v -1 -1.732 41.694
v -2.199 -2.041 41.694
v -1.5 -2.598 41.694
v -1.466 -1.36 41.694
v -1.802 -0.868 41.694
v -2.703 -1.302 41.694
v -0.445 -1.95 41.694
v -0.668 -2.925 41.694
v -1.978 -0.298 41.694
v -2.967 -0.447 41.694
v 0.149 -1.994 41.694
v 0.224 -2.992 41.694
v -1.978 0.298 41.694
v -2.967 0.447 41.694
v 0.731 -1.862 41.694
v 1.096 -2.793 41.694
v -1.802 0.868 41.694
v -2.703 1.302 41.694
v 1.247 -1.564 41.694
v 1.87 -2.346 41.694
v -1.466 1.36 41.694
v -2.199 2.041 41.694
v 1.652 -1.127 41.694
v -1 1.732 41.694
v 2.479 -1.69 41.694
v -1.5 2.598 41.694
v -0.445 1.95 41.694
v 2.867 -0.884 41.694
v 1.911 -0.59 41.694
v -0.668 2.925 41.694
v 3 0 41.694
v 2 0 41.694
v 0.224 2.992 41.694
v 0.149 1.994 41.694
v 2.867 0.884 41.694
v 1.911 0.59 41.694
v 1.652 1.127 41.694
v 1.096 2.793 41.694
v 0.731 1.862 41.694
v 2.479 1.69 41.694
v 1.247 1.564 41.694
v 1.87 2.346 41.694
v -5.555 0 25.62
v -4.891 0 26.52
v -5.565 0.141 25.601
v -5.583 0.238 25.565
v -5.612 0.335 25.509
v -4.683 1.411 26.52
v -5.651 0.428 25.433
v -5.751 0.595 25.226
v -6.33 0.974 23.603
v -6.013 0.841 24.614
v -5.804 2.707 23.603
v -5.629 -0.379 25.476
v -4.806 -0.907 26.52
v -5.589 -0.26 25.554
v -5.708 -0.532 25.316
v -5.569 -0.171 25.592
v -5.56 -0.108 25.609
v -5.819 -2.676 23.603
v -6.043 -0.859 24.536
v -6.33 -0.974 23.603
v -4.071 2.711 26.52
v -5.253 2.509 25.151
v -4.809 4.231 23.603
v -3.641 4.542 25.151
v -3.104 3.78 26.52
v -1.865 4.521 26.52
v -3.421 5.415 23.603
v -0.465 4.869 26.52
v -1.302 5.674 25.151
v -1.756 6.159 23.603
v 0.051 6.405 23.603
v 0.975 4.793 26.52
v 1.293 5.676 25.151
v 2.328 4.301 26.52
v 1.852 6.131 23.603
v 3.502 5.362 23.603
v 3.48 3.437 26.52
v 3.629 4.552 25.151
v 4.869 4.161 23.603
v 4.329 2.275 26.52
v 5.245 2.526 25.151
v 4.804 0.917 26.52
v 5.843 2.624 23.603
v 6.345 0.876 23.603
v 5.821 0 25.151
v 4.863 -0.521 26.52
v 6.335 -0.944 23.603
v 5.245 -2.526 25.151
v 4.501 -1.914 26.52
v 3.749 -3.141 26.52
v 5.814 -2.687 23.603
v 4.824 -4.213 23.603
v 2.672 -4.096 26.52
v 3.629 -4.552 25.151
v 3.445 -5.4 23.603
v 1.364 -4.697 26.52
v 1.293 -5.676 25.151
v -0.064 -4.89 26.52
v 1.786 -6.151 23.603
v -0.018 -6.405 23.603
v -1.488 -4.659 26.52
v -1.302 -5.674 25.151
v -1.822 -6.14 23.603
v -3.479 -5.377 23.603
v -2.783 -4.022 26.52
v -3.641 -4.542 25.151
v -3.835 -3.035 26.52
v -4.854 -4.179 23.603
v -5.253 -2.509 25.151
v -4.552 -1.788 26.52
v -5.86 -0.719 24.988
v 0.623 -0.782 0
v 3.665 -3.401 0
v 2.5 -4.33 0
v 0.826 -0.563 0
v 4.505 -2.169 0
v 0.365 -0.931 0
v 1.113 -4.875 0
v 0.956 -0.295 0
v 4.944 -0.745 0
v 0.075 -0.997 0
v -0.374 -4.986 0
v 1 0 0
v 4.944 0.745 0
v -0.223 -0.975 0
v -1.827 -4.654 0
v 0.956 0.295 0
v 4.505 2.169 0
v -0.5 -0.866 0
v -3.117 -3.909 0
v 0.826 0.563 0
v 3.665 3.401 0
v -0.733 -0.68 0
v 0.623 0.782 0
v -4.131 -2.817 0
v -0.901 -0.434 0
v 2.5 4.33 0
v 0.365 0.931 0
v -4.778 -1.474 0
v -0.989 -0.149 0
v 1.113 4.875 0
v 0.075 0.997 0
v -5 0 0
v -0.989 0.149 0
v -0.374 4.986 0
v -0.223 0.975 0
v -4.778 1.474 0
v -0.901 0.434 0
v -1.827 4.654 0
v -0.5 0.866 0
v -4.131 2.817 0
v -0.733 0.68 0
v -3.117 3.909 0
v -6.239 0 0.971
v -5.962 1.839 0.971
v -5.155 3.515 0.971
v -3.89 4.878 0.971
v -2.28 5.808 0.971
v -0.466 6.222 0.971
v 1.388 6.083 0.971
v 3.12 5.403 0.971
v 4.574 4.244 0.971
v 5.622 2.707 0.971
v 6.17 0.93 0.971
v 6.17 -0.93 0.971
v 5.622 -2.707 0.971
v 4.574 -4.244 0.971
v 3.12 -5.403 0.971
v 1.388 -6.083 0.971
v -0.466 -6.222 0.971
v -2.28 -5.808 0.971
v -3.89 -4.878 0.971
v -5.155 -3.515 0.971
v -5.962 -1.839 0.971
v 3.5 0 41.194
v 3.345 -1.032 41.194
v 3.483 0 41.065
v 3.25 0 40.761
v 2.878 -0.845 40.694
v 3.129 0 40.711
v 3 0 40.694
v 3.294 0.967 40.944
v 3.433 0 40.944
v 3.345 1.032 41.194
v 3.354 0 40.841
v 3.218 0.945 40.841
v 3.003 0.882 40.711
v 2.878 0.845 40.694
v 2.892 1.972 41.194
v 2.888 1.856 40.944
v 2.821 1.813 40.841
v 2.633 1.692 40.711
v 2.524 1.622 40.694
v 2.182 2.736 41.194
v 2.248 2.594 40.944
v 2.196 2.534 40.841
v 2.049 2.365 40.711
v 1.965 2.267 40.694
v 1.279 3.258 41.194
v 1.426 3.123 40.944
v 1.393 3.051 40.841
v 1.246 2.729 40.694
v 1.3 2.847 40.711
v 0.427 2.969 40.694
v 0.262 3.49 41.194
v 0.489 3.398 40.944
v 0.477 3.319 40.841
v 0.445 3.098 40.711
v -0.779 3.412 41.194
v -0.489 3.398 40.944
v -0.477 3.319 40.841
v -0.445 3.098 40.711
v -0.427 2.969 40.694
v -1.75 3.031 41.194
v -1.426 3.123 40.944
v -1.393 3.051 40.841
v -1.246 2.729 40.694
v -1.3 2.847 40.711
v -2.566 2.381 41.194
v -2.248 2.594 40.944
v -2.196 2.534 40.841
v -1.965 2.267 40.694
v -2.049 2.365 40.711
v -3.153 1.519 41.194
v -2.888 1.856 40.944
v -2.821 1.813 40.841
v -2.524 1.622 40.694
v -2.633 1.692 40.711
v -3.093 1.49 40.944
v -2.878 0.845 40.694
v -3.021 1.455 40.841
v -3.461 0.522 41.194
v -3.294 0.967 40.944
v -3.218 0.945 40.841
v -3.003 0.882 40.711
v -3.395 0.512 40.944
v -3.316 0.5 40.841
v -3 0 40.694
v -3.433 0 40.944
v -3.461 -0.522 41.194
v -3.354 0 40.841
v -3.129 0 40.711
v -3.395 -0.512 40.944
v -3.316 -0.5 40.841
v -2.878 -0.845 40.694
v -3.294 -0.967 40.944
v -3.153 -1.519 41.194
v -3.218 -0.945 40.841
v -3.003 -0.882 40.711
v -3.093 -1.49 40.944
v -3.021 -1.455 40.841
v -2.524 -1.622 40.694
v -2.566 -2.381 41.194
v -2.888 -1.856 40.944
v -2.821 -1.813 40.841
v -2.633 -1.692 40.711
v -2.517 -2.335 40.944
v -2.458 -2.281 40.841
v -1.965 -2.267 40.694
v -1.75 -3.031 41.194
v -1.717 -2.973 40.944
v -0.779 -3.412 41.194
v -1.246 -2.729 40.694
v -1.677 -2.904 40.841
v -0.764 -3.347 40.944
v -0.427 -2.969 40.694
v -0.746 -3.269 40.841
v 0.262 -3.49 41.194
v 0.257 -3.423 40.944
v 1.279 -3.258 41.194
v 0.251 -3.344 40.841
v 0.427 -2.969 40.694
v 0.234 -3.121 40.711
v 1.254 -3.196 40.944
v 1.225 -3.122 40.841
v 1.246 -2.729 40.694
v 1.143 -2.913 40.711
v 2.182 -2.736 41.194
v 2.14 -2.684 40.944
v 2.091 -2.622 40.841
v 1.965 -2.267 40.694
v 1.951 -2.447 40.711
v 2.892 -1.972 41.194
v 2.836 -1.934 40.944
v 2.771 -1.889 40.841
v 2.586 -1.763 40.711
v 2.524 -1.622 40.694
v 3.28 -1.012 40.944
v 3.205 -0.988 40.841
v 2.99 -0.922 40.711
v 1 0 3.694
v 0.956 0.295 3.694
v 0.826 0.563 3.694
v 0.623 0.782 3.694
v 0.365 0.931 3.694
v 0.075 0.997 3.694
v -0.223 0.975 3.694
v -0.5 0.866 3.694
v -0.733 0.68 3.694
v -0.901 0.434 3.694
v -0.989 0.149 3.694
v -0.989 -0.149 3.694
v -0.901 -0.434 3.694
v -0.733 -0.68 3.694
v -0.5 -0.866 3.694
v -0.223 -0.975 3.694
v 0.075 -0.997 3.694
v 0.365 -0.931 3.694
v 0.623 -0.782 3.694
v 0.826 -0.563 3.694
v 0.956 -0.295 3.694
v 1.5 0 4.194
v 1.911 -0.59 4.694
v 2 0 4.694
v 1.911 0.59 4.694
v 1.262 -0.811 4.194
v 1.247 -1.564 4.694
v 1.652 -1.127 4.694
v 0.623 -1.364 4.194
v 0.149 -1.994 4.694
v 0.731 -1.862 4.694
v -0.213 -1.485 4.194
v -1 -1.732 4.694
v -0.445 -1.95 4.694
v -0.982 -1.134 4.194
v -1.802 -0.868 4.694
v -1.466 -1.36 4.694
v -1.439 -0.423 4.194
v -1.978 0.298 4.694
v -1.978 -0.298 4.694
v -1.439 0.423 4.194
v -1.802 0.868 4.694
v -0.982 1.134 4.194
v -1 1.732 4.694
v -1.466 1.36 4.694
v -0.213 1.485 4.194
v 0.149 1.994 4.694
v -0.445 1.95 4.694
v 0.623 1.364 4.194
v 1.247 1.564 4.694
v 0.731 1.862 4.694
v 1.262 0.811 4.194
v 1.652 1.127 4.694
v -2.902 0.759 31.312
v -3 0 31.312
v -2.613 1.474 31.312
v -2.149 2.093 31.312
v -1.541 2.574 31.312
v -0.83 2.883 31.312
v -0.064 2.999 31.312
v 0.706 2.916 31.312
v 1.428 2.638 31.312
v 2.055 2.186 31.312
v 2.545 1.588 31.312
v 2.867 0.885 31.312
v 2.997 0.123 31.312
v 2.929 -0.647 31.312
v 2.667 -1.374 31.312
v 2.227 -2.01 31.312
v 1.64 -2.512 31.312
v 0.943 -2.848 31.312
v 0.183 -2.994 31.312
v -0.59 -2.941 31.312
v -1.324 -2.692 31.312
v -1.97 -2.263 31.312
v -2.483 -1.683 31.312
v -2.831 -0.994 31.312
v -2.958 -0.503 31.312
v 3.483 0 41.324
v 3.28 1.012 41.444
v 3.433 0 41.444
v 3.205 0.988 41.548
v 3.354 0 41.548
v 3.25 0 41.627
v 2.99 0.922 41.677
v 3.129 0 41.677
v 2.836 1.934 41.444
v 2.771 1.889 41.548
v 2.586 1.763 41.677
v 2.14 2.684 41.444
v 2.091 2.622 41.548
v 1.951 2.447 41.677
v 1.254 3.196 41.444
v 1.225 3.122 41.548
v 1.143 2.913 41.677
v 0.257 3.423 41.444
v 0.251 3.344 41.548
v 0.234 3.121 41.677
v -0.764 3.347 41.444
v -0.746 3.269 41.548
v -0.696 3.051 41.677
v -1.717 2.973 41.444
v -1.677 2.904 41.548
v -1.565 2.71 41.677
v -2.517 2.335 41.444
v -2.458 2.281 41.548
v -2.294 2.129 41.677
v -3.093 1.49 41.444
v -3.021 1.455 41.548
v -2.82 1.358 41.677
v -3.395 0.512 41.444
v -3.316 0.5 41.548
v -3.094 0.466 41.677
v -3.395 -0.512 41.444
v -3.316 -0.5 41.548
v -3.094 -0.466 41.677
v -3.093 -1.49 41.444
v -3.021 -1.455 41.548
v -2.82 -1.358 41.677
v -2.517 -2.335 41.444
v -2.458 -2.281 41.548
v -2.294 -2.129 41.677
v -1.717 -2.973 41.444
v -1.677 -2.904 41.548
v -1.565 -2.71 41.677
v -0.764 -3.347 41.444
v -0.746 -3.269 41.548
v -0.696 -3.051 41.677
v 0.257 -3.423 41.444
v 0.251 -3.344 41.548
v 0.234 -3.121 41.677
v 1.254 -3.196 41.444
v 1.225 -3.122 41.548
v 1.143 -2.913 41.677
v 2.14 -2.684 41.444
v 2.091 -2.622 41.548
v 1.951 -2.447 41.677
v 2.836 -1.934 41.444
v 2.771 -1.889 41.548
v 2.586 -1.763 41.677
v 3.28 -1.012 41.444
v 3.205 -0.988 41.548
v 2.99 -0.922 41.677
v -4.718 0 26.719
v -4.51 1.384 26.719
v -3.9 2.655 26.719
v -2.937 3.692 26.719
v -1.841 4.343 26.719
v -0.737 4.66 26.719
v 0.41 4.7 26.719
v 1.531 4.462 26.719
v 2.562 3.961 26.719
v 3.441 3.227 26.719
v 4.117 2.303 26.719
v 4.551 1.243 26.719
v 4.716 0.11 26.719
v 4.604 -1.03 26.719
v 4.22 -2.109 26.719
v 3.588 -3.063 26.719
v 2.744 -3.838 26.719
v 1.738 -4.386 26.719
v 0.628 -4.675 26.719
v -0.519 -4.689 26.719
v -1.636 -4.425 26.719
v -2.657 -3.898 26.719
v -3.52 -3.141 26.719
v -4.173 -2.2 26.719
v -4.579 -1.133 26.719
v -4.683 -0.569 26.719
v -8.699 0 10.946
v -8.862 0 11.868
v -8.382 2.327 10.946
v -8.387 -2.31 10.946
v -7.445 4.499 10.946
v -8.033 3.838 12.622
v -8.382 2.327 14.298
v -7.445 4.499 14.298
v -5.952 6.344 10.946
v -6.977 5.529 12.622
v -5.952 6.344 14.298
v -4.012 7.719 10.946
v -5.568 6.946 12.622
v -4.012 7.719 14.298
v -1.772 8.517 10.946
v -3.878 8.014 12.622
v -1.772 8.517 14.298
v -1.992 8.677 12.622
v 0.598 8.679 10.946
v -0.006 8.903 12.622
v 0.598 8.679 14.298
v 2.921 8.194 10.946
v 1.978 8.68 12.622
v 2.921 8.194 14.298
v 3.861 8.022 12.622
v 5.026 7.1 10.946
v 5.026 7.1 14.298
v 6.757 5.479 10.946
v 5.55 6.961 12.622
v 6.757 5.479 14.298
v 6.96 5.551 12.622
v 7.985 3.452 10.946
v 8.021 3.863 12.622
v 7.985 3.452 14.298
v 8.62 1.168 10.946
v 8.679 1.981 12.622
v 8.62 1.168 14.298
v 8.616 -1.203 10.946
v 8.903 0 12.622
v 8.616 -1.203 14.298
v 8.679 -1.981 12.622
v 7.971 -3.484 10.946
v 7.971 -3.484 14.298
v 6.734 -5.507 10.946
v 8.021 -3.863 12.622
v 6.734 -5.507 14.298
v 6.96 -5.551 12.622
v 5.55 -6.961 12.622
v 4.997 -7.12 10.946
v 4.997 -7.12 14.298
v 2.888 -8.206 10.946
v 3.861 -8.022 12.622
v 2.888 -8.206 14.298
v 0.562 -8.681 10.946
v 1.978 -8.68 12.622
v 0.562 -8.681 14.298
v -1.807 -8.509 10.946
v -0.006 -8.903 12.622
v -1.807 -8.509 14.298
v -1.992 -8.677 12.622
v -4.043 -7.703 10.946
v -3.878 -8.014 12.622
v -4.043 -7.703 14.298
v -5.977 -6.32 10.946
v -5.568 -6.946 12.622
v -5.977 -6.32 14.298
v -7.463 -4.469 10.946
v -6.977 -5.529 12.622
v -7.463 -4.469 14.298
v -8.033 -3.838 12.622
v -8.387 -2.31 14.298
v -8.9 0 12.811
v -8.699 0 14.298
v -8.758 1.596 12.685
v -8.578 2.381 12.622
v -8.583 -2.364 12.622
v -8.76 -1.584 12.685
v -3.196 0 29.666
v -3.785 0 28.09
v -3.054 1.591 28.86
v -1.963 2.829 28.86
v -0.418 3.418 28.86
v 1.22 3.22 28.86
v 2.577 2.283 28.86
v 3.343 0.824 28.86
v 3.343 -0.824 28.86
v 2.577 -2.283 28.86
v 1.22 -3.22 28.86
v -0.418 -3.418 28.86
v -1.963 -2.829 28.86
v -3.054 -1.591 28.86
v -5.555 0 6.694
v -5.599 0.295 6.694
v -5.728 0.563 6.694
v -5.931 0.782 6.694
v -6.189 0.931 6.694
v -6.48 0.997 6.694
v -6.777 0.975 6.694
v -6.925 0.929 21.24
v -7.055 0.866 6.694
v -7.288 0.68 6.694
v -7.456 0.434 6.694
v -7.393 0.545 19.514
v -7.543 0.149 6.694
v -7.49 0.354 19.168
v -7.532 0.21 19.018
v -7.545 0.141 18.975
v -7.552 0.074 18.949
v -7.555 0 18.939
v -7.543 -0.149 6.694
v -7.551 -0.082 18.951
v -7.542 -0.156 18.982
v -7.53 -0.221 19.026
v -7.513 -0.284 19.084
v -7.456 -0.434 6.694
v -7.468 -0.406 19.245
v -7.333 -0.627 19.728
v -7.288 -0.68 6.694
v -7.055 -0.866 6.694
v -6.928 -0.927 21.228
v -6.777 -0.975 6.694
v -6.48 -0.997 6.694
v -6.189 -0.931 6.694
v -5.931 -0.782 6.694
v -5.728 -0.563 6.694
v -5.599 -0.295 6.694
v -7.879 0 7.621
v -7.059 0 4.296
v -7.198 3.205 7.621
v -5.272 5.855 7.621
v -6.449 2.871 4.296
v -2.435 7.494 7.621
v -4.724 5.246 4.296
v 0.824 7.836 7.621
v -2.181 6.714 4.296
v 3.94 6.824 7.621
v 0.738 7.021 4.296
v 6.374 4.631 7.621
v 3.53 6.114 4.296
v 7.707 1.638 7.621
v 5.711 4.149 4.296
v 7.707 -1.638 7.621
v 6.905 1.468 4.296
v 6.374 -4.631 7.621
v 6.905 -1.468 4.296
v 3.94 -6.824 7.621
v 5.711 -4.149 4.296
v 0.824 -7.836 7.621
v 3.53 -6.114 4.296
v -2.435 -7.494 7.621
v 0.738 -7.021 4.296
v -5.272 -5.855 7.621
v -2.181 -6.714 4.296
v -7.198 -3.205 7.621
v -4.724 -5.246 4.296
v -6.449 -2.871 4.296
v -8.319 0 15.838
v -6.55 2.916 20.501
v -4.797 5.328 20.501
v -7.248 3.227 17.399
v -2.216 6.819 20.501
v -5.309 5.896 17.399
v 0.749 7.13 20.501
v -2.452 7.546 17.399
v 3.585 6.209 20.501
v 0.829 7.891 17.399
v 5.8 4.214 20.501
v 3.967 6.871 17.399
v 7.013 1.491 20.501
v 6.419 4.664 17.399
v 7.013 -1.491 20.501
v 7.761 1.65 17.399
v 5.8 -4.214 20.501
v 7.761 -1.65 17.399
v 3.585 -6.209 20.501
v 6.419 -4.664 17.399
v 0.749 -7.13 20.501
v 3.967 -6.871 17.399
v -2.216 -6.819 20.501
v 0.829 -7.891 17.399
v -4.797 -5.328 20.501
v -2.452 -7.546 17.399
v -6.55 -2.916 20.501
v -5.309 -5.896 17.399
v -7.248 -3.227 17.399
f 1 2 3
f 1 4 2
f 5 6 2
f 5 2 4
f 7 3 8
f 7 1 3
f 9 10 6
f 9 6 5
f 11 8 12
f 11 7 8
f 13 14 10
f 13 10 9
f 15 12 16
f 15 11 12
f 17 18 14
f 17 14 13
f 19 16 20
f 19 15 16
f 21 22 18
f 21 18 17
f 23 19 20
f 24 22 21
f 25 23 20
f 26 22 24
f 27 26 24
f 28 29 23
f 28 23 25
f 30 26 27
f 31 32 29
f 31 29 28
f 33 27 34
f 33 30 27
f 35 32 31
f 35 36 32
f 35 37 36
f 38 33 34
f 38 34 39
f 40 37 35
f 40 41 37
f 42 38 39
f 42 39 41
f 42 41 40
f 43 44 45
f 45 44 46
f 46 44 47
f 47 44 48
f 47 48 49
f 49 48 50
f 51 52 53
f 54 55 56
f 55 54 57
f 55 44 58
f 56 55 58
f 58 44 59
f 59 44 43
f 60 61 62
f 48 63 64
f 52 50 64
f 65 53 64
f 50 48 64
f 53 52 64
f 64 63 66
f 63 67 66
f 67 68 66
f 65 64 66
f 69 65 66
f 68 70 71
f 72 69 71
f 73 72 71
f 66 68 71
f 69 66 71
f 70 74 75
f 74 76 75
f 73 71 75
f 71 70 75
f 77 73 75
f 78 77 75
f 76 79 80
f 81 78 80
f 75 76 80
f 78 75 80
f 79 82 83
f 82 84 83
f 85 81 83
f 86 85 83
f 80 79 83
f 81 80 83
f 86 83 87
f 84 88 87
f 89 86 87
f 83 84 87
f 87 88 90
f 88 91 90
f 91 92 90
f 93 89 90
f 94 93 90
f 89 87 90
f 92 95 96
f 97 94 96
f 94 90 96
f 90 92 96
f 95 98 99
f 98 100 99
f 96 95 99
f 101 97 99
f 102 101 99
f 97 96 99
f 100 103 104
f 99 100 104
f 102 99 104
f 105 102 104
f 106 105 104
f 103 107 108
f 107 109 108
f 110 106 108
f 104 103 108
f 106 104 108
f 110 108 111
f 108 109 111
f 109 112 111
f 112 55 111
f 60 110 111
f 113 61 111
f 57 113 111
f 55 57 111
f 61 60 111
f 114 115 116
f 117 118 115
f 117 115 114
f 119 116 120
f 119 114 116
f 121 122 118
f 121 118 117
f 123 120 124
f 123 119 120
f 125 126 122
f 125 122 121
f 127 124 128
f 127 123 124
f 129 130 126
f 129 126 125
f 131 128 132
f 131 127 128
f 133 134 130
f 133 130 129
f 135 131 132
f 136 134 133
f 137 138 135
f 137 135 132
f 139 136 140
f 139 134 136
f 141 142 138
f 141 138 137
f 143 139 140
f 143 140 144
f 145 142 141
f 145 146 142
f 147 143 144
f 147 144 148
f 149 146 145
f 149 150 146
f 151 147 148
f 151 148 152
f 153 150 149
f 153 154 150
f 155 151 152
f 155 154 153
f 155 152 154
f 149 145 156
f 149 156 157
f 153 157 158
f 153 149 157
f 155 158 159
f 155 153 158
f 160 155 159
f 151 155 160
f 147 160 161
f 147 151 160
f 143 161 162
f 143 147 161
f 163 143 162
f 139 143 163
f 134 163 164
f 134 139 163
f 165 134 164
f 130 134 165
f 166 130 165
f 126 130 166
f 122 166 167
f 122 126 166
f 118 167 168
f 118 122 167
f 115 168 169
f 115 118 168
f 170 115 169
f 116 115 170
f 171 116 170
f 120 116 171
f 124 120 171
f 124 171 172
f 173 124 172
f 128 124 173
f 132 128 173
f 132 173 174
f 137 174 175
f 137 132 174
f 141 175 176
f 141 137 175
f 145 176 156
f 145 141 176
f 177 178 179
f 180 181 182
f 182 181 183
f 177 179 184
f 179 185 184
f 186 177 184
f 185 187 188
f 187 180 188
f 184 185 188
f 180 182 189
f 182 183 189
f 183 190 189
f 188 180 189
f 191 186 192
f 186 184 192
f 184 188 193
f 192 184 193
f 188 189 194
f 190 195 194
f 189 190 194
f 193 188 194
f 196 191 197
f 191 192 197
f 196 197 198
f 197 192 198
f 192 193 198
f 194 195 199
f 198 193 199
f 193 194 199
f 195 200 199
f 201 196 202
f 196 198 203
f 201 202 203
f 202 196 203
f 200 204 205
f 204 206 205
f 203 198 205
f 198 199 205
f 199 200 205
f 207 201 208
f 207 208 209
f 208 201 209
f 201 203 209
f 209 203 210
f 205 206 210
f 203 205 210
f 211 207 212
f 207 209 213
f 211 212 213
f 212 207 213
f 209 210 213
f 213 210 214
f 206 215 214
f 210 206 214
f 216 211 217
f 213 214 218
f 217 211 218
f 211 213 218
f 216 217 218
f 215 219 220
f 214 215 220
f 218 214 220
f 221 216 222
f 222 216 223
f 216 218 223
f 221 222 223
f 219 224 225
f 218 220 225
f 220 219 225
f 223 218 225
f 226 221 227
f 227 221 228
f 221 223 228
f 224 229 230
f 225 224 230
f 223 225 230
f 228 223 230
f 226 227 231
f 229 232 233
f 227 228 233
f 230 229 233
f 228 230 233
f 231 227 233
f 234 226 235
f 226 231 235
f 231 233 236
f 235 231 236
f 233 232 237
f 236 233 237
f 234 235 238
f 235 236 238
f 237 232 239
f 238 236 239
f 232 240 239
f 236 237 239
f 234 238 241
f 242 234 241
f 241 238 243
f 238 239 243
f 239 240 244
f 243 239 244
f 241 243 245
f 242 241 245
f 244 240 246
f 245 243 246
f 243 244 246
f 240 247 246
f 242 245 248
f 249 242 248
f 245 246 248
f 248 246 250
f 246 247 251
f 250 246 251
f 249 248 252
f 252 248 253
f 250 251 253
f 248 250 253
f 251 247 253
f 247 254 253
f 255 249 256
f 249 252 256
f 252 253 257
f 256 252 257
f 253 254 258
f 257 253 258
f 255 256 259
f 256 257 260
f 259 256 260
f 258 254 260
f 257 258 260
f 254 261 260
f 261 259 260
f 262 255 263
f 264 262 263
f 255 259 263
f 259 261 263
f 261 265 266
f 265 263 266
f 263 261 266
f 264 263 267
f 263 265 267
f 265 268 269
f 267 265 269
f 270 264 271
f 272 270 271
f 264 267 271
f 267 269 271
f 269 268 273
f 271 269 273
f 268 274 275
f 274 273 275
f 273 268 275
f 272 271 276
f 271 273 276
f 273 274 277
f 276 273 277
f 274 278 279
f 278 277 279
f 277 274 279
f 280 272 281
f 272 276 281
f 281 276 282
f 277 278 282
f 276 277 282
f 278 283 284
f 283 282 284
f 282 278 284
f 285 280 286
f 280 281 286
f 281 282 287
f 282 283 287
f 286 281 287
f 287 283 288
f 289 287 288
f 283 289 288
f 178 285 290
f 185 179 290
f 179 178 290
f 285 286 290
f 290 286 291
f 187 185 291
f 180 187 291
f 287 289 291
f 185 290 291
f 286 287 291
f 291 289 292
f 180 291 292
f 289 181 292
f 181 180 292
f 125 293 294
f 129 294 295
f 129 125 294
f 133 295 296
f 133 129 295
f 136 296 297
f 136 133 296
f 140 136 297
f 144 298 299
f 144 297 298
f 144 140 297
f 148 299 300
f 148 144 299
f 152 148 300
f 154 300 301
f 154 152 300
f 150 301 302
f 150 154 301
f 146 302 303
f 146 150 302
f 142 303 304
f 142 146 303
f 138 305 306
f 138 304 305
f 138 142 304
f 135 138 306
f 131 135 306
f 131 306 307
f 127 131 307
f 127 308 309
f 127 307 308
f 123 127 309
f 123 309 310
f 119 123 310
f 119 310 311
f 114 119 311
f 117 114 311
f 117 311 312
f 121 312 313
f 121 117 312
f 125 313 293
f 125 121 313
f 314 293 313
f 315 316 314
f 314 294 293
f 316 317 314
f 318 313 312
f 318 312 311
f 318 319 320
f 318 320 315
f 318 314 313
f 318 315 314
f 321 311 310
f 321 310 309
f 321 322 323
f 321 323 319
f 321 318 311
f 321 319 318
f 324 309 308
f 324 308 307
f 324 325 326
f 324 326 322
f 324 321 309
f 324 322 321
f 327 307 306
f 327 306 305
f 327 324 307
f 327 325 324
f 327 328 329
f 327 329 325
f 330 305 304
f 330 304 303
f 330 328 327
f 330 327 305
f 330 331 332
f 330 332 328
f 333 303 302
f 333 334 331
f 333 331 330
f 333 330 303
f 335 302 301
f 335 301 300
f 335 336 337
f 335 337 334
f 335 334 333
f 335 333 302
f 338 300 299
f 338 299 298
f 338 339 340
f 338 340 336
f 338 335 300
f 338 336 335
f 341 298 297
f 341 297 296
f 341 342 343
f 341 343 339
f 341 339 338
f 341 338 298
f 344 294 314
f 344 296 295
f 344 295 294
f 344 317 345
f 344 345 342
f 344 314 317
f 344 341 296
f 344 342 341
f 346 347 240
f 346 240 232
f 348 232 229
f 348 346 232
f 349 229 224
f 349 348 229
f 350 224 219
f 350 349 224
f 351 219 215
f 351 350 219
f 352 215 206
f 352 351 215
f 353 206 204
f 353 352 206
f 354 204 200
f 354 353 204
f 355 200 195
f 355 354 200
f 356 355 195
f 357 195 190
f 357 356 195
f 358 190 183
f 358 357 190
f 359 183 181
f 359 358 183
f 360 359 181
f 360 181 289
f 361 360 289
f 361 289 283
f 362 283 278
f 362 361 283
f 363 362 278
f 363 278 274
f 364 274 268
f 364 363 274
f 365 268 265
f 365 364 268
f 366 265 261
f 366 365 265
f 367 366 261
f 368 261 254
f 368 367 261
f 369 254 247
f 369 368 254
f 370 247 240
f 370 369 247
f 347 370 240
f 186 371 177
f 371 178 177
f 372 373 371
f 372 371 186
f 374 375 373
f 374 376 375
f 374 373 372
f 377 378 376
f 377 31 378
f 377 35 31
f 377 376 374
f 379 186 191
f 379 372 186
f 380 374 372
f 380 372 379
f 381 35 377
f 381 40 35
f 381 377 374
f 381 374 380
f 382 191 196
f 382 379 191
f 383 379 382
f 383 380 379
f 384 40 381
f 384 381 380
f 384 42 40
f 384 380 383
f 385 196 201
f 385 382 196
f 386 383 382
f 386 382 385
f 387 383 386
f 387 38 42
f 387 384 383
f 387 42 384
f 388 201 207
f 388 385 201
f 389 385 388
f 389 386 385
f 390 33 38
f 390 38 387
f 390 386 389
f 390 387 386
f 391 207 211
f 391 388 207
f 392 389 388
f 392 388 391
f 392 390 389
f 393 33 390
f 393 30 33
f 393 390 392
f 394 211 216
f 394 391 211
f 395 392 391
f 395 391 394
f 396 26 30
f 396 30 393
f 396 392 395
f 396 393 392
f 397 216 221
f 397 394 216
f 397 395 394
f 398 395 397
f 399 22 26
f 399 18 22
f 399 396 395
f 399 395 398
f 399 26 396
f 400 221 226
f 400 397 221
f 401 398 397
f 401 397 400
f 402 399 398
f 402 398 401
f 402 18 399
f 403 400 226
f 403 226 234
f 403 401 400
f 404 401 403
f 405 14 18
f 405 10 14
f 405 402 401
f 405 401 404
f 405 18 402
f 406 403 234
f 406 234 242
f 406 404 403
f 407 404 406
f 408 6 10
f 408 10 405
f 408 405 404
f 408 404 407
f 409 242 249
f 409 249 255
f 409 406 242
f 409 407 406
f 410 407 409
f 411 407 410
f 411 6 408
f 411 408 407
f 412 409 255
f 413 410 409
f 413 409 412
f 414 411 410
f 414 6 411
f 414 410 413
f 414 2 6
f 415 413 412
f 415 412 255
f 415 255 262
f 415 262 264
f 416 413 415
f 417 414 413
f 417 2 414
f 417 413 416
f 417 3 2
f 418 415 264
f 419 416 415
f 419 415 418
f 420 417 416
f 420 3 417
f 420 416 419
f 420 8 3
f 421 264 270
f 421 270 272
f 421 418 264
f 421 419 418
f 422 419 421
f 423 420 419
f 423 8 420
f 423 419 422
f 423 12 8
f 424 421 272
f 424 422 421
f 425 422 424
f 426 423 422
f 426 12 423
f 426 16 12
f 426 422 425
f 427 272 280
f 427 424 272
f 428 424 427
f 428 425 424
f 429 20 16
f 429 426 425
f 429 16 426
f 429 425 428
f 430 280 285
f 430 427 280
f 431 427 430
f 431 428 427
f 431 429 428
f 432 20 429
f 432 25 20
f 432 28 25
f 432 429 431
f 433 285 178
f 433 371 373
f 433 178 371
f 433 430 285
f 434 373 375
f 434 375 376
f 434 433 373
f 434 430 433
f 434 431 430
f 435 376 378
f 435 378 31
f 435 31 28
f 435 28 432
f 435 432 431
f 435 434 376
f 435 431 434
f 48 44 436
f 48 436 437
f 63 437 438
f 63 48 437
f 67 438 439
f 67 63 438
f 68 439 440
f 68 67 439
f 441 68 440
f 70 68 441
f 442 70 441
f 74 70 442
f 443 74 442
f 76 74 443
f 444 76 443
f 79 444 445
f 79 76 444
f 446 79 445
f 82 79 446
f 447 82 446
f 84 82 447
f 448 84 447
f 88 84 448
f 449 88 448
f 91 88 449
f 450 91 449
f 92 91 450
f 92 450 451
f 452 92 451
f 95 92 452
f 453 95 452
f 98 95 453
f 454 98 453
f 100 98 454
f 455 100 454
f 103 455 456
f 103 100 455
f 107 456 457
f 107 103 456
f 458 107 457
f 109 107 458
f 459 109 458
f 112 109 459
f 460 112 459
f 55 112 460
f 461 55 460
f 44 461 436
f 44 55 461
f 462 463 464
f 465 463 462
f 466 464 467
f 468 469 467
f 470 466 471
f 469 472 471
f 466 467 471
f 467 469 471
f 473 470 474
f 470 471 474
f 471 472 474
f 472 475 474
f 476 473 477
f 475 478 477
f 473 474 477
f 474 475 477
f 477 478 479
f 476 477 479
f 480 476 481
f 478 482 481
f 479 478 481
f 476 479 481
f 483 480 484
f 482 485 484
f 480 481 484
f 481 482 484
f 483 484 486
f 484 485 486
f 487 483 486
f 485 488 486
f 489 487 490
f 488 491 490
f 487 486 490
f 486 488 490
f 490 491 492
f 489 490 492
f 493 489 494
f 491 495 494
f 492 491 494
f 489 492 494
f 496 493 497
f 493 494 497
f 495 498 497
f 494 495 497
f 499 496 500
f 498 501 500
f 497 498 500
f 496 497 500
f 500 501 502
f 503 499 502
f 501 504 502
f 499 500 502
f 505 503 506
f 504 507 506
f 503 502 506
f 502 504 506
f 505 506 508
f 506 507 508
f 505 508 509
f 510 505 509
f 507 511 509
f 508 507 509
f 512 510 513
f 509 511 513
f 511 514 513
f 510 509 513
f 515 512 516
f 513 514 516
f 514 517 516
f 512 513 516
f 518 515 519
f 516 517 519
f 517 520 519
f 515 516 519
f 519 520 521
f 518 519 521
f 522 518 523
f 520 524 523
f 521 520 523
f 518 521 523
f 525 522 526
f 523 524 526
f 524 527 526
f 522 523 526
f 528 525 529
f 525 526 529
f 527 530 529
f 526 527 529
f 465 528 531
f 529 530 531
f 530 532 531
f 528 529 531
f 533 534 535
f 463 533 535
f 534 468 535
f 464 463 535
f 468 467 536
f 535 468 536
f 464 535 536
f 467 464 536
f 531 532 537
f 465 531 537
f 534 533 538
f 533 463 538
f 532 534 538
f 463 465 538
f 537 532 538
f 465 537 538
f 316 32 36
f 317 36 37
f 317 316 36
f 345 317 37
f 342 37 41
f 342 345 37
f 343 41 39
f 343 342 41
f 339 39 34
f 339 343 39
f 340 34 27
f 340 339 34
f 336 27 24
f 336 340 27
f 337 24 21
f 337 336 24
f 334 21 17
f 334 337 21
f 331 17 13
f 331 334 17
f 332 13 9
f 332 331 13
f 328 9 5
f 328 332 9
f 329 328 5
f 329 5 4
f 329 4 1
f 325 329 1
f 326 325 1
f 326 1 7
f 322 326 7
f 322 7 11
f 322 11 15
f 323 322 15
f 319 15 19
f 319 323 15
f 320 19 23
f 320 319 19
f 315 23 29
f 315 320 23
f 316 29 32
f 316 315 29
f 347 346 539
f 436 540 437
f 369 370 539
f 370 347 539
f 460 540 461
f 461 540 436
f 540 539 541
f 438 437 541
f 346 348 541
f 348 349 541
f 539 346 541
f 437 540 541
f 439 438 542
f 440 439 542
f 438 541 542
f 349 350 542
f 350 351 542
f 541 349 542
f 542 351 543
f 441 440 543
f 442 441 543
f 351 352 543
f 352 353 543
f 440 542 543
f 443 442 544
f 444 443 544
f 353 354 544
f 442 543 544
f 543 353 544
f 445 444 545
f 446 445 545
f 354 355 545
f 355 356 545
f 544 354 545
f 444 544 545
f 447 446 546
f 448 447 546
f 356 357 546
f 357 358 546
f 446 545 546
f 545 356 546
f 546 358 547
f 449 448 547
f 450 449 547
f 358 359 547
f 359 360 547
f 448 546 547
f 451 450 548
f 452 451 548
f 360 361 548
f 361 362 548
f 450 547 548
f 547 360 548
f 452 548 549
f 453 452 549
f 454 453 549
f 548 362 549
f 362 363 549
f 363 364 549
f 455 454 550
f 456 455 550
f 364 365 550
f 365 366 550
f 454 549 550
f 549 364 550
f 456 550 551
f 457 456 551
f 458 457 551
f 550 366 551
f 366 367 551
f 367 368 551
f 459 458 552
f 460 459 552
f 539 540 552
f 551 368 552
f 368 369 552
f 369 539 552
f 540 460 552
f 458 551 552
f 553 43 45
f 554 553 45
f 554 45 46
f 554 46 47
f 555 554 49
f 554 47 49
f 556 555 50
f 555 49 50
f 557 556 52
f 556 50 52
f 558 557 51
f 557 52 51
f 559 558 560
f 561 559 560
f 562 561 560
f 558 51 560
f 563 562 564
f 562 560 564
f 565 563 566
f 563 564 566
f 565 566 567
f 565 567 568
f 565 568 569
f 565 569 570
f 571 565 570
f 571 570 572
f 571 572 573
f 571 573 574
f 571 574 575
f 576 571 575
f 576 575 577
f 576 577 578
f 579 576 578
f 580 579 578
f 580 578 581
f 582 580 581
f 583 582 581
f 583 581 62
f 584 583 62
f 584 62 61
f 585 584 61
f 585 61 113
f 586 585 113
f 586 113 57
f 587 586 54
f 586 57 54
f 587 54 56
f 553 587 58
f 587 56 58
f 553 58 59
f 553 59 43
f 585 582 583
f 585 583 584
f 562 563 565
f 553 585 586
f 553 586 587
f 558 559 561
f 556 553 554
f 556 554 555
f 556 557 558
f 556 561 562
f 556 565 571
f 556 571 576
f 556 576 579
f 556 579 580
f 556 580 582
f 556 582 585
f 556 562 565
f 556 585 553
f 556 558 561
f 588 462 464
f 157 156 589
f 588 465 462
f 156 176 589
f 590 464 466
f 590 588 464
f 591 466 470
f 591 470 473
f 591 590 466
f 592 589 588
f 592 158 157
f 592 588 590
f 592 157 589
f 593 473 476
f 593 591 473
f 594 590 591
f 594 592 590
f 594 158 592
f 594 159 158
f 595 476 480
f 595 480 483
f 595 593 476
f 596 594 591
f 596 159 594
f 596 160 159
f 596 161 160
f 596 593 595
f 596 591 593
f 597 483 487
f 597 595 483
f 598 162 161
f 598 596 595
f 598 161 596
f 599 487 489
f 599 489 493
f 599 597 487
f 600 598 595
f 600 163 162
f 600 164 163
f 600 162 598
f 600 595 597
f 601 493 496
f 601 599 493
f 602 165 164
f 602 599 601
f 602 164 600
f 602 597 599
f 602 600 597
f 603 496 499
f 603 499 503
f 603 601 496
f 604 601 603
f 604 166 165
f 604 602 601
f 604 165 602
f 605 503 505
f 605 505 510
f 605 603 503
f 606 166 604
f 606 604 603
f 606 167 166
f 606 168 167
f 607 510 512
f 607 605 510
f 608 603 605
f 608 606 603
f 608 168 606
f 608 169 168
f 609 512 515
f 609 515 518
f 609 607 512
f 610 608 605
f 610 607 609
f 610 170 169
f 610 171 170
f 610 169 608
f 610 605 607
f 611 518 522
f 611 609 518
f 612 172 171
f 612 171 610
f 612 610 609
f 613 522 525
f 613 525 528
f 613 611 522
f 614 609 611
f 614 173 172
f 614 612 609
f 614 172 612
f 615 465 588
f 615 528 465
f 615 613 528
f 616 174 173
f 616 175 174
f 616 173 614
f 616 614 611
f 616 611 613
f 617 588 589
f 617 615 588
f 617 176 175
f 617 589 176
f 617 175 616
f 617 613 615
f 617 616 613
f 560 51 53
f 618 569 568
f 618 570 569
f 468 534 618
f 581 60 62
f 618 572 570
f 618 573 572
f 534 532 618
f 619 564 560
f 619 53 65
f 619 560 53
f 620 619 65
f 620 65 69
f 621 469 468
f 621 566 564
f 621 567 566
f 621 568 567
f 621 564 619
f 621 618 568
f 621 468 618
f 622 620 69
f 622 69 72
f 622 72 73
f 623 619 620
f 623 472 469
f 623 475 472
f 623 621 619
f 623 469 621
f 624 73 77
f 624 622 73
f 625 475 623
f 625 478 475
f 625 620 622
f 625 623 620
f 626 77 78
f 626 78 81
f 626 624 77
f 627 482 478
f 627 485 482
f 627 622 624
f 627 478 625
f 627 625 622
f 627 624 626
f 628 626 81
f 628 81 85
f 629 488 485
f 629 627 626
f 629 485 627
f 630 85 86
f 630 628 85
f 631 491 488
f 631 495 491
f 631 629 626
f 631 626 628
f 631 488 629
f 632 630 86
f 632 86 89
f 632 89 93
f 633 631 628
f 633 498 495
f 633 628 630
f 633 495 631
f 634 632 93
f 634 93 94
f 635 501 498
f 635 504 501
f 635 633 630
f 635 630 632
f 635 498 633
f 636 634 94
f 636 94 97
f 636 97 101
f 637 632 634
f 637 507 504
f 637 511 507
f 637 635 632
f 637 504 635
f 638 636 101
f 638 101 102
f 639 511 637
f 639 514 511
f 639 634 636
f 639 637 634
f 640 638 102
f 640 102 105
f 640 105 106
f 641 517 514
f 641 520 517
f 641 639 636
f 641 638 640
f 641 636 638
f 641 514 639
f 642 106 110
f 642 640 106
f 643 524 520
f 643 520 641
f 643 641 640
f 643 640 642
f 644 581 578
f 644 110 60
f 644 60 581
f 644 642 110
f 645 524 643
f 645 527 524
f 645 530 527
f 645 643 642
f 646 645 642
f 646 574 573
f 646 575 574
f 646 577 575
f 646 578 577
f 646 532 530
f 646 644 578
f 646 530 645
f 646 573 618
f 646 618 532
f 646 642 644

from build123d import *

# Parameters (mm, degrees)
F2_R        = 1
F3_DEPTH    = 10
F4_R        = 3.5
F4_R_2      = 2
F5_DEPTH    = 1
F6_DEPTH    = 35
F7_S5_R     = 2
F7_T6_DEPTH = 6
F8_R        = 0.49999
F9_R        = 7
F10_SIZE    = 1
F11_R       = 1
F12_DEPTH   = 35


# Not quite as in the source:
# - a fillet or chamfer that OpenCascade refuses, or shapes differently, is made with other operations: its cross-section is extruded or revolved along the edge and cut away or added
# - a fillet or chamfer is up to 0.001 mm smaller than in the source, because OpenCascade refuses the exact size


with BuildPart() as f1:
    # F0 (on Front) → F1 (revolve)
    with BuildSketch(Plane.XZ):
        Polygon((-6, 0), (0, 0), (0, 40.6942627281), (-3, 40.6942627281), (-3, 28.6942627281), (-6, 25.2438845978), (-9.1123259154, 12.6219422989), align=None)
    revolve(axis=Axis((0, 0, 20.347131364), (0, 0, -1)))

    # F2 (on Top) → F3 (cut)
    with BuildSketch(Plane.XY):
        Circle(F2_R)
    extrude(amount=F3_DEPTH, mode=Mode.SUBTRACT)

    # F4 (on face) → F5 (join)
    with BuildSketch(Plane.XY.offset(40.6942627281)):
        Circle(F4_R)
        Circle(F4_R_2, mode=Mode.SUBTRACT)
    extrude(amount=F5_DEPTH)

    # F6 (cut): a face of the model
    f6_faces = [f1.faces().sort_by_distance(p)[0] for p in [
        (0, 0, 40.6942627281),
    ]]
    extrude(f6_faces, amount=-F6_DEPTH, mode=Mode.SUBTRACT)

    # F7: chamfer of 2 on 1 edges, made by hand


with BuildPart() as f7_tool2:
    # F7_s3 → F7_t4 (revolve)
    with BuildSketch(Plane.XZ):
        Polygon((1, 3.6942627281), (3, 5.6942627281), (1, 5.6942627281), align=None)
    revolve(axis=Axis((0, 0, 5.6942627281), (0, 0, -1)))

    # F7_s5 → F7_t6 (intersect, symmetric)
    with BuildSketch(Plane.XY.offset(4.7)):
        Circle(F7_S5_R)
    extrude(amount=F7_T6_DEPTH, both=True, mode=Mode.INTERSECT)


with BuildPart() as f1_1:
    add(f1.part)

    # F7_t1: cut F7_tool2
    add(f7_tool2.part, mode=Mode.SUBTRACT)

    # F8 (radius 0.5 in the source; OpenCascade refuses exactly that, so slightly less here)
    f8_edges = [f1_1.edges().sort_by_distance(p)[0] for p in [
        (-3.5, 0, 41.694263),
        (-3.5, 0, 40.694263),
    ]]
    fillet(f8_edges, radius=F8_R)

    # F9
    f9_edges = [f1_1.edges().sort_by_distance(p)[0] for p in [
        (3, 0, 28.694263),
        (6, 0, 25.243885),
        (9.112326, 0, 12.621942),
    ]]
    fillet(f9_edges, radius=F9_R)

    # F10
    f10_edges = [f1_1.edges().sort_by_distance(p)[0] for p in [
        (6, 0, 0),
    ]]
    chamfer(f10_edges, length=F10_SIZE)

    # F11 (on face) → F12 (cut)
    with BuildSketch(Plane.XY.offset(41.6942627281)):
        with Locations((-6.5546142869, 0)):
            Circle(F11_R)
    extrude(amount=-F12_DEPTH, mode=Mode.SUBTRACT)


solid = f1_1.part
